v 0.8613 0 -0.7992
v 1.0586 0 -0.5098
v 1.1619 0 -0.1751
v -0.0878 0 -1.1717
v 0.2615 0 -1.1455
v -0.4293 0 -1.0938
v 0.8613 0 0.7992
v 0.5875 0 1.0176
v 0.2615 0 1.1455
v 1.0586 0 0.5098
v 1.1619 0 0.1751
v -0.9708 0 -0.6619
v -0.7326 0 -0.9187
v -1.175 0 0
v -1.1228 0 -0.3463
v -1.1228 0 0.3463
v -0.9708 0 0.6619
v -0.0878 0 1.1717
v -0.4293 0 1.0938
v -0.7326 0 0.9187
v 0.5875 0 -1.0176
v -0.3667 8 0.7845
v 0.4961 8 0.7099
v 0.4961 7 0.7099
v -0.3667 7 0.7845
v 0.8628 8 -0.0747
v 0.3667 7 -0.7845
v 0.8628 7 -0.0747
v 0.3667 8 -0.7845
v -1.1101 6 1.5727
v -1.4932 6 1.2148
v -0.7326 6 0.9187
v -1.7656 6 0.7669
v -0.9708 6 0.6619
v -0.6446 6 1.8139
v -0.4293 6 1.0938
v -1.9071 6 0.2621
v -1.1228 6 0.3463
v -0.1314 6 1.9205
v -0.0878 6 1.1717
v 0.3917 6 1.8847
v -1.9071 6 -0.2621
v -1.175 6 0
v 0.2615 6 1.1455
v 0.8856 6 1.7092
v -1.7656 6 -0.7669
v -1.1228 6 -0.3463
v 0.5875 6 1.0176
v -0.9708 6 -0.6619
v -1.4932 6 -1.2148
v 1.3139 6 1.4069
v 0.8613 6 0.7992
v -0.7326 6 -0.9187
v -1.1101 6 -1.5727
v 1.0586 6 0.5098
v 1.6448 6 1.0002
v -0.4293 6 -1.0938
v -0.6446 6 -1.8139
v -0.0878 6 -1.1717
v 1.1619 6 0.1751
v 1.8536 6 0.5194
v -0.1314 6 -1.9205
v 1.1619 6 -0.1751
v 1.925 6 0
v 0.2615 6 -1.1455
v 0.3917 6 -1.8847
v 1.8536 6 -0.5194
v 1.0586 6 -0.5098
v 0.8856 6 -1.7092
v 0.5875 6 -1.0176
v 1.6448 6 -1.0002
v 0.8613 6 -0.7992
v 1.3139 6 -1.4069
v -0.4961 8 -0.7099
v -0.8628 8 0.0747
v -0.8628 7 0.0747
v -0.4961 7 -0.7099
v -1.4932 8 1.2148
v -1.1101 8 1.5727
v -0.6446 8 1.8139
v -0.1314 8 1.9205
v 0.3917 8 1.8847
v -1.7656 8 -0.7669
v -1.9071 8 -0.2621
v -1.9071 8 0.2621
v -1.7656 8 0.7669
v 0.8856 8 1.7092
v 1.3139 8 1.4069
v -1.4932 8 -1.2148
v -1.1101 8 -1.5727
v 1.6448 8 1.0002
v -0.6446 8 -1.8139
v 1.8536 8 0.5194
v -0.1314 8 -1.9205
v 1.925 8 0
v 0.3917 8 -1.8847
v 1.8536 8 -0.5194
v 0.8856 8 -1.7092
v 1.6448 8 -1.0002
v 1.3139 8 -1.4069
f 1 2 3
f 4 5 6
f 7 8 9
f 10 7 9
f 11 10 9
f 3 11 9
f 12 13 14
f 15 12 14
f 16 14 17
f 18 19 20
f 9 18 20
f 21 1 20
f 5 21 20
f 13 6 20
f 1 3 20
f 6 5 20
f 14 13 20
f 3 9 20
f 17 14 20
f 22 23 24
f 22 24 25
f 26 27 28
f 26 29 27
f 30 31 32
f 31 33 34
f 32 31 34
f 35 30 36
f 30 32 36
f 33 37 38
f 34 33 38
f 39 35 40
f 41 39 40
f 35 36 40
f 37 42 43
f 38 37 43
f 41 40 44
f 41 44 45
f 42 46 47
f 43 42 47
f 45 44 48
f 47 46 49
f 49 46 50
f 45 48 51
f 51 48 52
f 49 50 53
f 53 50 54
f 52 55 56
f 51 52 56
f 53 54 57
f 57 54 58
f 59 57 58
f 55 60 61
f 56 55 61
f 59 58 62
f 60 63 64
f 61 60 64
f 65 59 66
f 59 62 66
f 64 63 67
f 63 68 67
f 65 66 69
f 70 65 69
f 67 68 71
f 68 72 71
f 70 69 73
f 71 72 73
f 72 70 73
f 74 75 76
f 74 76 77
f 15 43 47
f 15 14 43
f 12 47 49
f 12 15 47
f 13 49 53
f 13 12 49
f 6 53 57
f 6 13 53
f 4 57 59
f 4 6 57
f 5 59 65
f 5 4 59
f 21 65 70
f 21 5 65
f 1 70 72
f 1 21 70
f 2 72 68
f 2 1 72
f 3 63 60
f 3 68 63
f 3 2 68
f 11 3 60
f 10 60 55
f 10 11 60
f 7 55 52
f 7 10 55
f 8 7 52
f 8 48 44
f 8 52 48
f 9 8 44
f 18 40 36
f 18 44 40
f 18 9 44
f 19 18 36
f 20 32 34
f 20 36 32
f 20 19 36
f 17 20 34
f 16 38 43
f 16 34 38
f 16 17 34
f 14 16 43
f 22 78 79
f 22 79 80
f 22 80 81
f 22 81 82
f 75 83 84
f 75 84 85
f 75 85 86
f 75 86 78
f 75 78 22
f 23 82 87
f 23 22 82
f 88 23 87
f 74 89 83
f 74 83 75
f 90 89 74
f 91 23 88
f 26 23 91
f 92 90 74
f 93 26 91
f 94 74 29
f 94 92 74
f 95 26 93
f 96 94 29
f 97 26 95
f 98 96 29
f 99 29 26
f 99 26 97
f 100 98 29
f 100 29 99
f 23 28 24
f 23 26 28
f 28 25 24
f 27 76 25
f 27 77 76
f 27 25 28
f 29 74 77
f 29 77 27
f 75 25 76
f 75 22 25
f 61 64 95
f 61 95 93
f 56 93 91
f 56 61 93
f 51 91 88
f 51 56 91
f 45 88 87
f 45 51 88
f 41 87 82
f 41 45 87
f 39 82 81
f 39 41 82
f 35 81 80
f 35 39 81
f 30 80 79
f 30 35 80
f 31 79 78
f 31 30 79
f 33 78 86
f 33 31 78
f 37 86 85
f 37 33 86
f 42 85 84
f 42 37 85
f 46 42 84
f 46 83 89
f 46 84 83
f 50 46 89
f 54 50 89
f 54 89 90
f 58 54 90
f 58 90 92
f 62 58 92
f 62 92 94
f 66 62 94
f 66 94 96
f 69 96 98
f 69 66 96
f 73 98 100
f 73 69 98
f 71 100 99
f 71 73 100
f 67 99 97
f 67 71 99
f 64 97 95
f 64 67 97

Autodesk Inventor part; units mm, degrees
ref_plane "YZ Plane" through (0, 0, 0) normal (1, 0, 0) x (0, 1, 0)
ref_plane "XZ Plane" through (0, 0, 0) normal (0, 1, 0) x (-1, 0, 0)
ref_plane "XY Plane" through (0, 0, 0) normal (0, 0, 1) x (1, 0, 0)
sketch "Sketch1" plane through (0, 0, 0) normal (0, 1, 0) x (-1, 0, 0)
  circle A0 centre (0, 0) radius 1.175
  dimension "d0" = 2.35
extrude "Extrusion1" add sketch "Sketch1" along normal blind 6
sketch "Sketch2" plane through (0, 6, 0) normal (0, 1, 0) x (1, 0, 0)
  circle A0 centre (0, 0) radius 1.175 projected
  circle A1 centre (0, 0) radius 1.925
  dimension "d3" = 3.85
extrude "Extrusion2" add sketch "Sketch2" along normal blind 2 contours A0 | A1
sketch "Sketch3" plane through (0, 8, 0) normal (0, 1, 0) x (1, 0, 0)
  line L0 (-0.4961, 0.7099) -> (0.3667, 0.7845)
  line L1 (0.3667, 0.7845) -> (0.8628, 0.0747)
  line L2 (0.8628, 0.0747) -> (0.4961, -0.7099)
  line L3 (0.4961, -0.7099) -> (-0.3667, -0.7845)
  line L4 (-0.3667, -0.7845) -> (-0.8628, -0.0747)
  line L5 (-0.8628, -0.0747) -> (-0.4961, 0.7099)
  point P0 (0, 0)
  point P1 (0, 0)
  dimension "d6" = 1.5
extrude "Extrusion3" cut sketch "Sketch3" against normal blind 1
equation "\"d0\" = M2_A"
equation "\"d3\" = M2_B"
equation "\"M2_A\" = 2.35"
equation "\"M2_B\" = 3.85"
properties part number "M2_SCREW_8MM"
